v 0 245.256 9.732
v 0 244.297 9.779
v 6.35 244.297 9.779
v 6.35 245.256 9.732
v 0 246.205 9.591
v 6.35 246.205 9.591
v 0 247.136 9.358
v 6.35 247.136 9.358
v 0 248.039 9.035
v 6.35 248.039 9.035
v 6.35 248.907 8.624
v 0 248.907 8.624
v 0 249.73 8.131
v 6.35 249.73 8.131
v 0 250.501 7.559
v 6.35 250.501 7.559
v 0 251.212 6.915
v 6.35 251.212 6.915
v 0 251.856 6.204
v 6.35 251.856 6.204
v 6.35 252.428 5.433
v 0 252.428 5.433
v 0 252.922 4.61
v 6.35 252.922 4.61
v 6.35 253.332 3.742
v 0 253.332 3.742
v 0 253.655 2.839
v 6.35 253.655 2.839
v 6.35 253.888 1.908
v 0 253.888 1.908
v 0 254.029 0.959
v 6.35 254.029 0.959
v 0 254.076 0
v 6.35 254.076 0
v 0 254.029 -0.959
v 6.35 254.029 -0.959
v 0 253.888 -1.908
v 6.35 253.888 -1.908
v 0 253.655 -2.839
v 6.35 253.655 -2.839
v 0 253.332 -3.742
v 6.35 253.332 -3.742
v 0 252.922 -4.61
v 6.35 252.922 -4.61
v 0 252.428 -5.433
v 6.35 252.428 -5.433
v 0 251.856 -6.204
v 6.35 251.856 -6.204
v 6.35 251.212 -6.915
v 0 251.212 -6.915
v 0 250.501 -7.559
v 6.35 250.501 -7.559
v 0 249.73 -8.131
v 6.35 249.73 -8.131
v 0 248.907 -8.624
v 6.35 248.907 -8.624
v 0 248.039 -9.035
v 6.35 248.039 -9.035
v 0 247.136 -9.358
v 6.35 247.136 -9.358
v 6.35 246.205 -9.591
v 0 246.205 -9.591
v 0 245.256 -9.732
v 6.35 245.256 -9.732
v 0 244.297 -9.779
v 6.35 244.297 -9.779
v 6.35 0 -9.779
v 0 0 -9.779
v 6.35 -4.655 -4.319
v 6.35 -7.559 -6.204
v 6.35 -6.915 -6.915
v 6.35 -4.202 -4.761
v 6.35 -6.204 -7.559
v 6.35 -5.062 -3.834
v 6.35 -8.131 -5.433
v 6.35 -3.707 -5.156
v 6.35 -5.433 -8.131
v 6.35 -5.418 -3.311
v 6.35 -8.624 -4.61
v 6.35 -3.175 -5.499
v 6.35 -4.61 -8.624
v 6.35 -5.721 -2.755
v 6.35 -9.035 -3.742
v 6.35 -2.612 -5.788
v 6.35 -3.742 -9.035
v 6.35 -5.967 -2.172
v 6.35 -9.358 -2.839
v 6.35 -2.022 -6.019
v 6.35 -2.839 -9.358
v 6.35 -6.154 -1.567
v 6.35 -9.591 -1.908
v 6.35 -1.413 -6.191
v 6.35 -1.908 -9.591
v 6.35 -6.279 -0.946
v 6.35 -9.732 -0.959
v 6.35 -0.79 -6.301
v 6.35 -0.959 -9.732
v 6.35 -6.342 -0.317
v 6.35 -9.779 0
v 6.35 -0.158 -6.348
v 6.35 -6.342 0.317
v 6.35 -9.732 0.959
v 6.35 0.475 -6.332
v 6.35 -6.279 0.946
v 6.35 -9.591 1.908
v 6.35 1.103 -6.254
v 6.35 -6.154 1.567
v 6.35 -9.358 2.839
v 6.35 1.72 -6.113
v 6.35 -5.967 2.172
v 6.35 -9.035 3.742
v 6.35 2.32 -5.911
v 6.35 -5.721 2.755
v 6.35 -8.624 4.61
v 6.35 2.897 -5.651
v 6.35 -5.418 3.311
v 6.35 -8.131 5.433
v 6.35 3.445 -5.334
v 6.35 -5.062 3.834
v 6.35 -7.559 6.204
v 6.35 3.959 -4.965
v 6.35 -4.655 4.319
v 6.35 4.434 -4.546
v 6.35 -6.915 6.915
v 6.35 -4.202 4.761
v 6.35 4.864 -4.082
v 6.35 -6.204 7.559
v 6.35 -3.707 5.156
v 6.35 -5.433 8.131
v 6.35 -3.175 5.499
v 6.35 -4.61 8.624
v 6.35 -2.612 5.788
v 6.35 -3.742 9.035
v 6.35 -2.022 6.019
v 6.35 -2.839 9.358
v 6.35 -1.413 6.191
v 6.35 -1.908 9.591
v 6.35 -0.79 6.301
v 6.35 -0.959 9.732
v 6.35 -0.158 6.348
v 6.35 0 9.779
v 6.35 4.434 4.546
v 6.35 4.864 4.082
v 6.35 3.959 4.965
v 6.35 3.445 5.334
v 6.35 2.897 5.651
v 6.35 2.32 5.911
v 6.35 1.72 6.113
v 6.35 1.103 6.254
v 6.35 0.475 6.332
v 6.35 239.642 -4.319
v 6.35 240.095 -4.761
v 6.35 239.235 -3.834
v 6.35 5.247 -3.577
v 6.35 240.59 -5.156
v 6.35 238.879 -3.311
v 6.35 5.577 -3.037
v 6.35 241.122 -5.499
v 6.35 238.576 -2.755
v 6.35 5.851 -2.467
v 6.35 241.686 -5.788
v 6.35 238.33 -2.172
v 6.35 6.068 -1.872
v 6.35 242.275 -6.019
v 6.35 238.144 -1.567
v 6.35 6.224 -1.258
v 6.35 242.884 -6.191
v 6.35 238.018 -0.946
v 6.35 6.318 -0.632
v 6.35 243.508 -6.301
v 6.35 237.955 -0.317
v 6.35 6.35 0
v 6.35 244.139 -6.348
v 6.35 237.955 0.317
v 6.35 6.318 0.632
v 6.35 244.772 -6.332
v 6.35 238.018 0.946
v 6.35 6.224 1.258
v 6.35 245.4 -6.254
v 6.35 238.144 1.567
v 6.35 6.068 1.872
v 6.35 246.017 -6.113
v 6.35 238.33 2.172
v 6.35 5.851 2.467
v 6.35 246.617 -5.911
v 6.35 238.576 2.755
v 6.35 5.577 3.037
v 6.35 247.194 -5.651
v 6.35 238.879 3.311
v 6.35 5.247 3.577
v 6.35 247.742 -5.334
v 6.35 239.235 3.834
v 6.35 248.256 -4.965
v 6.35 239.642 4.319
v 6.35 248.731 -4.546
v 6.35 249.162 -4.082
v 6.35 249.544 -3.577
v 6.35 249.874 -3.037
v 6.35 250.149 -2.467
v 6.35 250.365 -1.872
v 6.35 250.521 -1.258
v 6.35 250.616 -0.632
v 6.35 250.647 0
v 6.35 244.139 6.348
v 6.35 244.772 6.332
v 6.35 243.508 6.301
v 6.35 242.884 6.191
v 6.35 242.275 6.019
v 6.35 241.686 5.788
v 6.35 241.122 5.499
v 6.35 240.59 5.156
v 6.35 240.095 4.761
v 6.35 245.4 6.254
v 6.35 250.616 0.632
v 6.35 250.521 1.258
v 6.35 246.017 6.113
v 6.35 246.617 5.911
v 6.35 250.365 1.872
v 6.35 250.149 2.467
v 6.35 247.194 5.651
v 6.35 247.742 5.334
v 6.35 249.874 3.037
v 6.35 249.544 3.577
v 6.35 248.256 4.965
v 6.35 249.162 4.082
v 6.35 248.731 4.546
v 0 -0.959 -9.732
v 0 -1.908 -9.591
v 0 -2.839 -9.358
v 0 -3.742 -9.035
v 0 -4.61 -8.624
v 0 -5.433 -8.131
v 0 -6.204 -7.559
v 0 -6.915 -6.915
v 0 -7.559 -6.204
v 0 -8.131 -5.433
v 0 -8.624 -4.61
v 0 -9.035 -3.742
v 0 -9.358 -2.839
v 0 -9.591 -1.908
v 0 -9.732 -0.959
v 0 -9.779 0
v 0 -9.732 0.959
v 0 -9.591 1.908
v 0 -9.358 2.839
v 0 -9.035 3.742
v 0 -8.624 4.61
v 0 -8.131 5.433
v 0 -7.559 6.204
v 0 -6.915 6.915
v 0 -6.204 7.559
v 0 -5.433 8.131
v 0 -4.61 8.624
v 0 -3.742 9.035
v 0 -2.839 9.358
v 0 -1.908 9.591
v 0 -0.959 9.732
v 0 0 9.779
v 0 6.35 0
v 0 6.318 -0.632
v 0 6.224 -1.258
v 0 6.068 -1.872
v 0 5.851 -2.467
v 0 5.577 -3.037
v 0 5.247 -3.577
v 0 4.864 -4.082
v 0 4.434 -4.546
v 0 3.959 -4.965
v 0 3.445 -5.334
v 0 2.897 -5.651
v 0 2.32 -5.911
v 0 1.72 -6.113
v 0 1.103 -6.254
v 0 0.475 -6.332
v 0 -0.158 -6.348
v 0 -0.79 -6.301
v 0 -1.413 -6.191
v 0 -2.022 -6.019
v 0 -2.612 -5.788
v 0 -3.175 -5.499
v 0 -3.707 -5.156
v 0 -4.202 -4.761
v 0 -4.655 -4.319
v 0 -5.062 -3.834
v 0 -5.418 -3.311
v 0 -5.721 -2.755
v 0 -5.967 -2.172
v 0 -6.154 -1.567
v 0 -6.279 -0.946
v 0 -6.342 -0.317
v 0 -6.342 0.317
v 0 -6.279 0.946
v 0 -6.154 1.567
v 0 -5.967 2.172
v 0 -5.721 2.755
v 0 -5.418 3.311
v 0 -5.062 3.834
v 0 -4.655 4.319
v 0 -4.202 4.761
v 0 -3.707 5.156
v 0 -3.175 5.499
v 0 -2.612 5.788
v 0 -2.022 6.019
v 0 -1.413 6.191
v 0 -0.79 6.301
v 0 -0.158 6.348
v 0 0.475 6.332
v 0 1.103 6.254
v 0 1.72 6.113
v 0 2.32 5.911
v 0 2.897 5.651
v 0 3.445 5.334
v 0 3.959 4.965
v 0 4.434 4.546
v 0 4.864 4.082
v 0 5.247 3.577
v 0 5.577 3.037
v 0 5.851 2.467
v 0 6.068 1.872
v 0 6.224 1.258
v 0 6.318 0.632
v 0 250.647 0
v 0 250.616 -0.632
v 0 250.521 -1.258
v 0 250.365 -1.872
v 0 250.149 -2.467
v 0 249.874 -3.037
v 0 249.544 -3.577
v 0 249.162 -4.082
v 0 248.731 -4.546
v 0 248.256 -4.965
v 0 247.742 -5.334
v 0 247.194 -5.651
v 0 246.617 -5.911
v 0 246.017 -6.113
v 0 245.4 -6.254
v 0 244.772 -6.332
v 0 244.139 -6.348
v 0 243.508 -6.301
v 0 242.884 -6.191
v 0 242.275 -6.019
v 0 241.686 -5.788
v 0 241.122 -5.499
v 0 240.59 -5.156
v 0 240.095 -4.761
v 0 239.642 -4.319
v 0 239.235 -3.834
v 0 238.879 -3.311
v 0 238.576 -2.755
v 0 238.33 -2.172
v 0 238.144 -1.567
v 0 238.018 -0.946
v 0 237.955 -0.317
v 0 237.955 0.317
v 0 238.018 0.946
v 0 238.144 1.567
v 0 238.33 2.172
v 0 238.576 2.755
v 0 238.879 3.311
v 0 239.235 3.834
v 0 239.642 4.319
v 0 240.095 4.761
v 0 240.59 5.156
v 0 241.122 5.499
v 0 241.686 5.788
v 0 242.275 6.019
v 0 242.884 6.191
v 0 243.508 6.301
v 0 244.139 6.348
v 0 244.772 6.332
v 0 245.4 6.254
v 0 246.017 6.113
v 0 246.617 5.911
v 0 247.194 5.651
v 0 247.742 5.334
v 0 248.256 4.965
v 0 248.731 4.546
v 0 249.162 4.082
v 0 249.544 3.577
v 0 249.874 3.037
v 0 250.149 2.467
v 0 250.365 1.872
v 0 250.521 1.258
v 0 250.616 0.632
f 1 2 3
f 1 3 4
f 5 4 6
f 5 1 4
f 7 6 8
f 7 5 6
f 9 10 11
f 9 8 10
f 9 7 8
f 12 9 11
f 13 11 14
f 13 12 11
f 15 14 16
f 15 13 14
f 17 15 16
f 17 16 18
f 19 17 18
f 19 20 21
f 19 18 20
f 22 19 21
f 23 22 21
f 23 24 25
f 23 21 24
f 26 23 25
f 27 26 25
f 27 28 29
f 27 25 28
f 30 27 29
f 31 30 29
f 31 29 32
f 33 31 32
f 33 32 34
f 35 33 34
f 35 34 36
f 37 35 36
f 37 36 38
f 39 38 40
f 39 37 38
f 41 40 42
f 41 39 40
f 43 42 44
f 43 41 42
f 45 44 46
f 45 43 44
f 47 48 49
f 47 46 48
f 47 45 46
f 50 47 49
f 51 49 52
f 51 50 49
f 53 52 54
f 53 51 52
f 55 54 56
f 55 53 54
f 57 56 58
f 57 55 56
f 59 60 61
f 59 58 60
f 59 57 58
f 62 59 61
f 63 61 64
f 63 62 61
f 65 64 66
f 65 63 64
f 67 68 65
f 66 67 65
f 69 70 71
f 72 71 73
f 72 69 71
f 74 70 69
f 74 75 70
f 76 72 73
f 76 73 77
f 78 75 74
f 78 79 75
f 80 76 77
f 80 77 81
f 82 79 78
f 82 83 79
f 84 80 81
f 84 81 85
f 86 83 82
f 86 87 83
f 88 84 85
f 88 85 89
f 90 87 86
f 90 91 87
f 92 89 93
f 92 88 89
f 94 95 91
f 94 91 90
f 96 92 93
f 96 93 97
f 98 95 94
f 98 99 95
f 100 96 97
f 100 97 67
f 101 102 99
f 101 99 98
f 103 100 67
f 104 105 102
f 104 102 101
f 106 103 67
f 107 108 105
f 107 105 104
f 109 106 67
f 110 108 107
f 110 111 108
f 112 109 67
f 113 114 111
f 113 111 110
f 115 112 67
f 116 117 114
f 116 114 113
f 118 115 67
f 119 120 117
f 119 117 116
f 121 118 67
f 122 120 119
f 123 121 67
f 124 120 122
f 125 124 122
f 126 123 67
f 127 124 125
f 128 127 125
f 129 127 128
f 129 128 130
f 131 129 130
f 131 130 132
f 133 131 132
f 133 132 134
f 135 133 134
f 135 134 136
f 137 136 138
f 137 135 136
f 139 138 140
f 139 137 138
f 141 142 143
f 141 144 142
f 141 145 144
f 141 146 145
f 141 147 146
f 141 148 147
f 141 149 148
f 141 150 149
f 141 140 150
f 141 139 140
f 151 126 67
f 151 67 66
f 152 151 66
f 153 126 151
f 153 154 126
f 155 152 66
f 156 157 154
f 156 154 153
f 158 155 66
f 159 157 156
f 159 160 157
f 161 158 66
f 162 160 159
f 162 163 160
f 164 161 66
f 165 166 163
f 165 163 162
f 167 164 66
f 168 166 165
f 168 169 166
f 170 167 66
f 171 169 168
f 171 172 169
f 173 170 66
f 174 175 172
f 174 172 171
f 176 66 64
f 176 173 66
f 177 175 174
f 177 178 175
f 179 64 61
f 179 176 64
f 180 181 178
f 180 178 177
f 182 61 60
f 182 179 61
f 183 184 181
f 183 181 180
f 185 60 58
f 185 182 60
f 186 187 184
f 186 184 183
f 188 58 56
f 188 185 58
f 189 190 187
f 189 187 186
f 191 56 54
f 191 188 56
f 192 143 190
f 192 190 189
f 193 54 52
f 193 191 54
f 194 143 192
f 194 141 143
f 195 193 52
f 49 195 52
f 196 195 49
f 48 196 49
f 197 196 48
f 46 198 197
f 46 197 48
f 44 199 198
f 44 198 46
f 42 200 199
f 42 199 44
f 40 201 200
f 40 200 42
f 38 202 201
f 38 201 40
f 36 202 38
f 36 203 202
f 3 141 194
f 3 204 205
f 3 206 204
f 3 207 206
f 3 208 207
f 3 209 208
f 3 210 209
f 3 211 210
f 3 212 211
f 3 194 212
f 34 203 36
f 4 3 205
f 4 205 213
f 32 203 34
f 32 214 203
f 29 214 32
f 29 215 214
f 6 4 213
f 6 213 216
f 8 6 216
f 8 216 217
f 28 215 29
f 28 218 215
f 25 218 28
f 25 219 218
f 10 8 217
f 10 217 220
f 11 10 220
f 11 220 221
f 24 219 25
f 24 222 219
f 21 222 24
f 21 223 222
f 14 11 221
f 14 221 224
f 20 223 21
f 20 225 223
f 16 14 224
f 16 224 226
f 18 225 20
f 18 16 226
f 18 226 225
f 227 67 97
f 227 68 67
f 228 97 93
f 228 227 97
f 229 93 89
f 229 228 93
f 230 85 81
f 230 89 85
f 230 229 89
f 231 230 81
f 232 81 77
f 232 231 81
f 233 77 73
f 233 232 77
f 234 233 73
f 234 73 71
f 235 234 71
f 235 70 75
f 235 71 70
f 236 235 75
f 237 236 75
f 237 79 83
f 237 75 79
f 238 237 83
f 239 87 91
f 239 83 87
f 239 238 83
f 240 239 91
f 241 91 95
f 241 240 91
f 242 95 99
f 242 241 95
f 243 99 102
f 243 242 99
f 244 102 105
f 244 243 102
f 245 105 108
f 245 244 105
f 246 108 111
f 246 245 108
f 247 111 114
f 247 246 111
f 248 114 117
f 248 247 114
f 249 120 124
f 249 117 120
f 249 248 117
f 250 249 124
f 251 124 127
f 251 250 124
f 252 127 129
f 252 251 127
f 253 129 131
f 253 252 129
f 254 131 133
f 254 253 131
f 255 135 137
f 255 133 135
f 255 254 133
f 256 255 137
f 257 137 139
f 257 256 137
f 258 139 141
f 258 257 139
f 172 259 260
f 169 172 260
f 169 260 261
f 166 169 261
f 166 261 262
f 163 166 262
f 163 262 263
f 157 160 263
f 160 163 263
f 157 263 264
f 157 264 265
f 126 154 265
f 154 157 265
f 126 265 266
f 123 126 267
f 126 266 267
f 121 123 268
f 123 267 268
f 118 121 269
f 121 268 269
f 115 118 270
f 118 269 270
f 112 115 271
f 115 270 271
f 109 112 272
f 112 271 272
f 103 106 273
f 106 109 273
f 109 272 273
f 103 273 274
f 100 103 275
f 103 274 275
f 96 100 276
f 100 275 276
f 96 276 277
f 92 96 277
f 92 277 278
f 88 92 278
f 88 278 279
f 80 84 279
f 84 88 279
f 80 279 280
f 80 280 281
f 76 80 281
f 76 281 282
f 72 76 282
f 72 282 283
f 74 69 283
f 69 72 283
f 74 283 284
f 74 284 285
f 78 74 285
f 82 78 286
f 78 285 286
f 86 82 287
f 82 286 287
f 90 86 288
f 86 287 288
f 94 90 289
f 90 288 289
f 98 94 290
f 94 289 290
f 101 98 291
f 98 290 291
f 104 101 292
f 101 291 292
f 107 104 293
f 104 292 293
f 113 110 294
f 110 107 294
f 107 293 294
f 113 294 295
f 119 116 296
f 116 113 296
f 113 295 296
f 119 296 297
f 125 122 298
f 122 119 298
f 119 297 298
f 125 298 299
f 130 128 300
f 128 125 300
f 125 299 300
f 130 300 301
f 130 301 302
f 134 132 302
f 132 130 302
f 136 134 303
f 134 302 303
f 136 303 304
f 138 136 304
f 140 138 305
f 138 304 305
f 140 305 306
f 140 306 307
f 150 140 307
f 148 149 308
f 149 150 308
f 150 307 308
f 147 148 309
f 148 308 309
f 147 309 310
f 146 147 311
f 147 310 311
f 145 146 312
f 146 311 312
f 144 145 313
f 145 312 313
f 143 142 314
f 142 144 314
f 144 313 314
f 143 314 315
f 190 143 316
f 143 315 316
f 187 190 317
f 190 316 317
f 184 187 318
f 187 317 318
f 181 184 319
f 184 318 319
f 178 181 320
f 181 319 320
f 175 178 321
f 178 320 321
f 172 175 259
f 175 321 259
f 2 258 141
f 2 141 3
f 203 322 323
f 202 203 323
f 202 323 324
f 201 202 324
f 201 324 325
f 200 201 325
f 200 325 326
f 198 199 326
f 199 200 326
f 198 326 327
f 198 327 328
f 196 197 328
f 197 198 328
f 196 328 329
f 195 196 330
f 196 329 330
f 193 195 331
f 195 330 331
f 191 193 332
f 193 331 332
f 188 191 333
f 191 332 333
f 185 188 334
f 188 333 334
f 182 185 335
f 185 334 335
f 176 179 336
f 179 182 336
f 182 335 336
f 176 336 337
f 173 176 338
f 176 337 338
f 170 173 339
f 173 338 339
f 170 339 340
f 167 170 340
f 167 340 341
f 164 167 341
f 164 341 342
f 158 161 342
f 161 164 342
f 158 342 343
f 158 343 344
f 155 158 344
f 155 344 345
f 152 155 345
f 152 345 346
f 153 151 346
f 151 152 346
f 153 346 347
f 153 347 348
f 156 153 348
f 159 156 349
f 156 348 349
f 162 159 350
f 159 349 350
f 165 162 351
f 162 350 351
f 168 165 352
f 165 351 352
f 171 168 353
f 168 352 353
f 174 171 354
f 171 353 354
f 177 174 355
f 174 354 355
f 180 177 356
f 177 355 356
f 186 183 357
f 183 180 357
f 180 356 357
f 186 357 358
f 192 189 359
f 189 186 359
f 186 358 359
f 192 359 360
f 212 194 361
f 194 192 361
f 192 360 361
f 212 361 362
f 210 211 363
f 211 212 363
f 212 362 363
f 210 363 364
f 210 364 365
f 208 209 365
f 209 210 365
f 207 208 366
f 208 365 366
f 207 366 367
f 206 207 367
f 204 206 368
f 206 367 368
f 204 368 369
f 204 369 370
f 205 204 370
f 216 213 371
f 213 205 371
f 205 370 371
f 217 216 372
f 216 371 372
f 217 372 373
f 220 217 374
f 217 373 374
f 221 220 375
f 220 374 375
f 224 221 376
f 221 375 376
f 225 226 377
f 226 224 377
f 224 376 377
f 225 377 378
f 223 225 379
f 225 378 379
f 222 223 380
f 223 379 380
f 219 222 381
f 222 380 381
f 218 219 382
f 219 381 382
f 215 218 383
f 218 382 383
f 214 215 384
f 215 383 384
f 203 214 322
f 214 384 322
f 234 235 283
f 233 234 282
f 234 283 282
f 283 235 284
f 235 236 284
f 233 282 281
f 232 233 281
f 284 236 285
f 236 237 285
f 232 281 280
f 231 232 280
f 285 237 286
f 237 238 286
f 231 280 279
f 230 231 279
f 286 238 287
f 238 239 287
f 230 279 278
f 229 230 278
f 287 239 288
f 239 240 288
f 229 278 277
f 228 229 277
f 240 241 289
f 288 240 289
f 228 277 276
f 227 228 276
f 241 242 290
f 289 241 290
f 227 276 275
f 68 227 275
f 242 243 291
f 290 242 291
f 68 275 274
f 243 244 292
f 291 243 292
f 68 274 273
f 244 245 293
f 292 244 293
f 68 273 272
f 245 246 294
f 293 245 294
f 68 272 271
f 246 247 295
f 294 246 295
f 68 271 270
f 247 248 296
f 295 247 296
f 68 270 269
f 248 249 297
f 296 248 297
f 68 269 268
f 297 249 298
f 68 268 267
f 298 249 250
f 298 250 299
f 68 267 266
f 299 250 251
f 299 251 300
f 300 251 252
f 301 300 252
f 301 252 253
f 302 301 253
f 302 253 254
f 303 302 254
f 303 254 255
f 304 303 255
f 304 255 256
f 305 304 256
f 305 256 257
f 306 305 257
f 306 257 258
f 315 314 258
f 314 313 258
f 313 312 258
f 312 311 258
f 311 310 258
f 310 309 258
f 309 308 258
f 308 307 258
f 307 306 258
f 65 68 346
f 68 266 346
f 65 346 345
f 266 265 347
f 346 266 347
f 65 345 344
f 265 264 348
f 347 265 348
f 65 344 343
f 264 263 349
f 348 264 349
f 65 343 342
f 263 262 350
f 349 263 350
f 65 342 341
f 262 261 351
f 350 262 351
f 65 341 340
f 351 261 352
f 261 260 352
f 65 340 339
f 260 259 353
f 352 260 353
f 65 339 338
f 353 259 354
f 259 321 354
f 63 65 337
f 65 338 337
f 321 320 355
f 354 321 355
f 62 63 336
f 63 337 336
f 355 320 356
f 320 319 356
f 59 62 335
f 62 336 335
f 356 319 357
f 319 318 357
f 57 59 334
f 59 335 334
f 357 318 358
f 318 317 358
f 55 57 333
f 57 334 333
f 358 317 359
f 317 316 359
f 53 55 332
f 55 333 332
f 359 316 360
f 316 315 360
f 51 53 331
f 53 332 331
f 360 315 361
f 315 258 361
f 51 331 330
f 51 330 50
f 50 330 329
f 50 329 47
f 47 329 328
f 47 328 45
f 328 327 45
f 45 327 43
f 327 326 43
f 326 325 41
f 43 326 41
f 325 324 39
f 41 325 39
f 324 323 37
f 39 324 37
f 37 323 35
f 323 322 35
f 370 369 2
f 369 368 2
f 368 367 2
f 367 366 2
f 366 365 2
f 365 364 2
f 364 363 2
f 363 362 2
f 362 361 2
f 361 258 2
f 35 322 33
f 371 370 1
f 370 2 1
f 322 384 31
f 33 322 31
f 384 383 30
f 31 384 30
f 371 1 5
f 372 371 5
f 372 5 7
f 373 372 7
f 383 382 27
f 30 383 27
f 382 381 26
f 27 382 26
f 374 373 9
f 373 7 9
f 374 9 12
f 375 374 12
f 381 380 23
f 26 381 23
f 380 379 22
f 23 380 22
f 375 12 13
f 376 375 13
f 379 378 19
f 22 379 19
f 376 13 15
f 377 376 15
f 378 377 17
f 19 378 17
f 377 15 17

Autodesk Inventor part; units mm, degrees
ref_plane "YZ Plane" through (0, 0, 0) normal (1, 0, 0) x (0, 1, 0)
ref_plane "XZ Plane" through (0, 0, 0) normal (0, 1, 0) x (-1, 0, 0)
ref_plane "XY Plane" through (0, 0, 0) normal (0, 0, 1) x (1, 0, 0)
sketch "Sketch1" plane through (0, 0, 0) normal (1, 0, 0) x (0, 1, 0)
  circle A0 centre (0, 0) radius 6.35
  arc A1 (0, 9.779) -> (0, -9.779) centre (0, 0) ccw
  line L0 (0, 9.779) -> (244.2972, 9.779)
  line L1 (0, -9.779) -> (244.2972, -9.779)
  arc A2 (244.2972, -9.779) -> (244.2972, 9.779) centre (244.2972, 0) ccw
  circle A3 centre (244.2972, 0) radius 6.35
  dimension "d0" = 12.7
  dimension "d1" = 19.558
  dimension "d2" = 244.2972
  dimension "d3" = 244.2972
  dimension "d4" = 12.7
extrude "Extrusion1" add sketch "Sketch1" along normal blind 6.35
properties part number "RollerArm"
